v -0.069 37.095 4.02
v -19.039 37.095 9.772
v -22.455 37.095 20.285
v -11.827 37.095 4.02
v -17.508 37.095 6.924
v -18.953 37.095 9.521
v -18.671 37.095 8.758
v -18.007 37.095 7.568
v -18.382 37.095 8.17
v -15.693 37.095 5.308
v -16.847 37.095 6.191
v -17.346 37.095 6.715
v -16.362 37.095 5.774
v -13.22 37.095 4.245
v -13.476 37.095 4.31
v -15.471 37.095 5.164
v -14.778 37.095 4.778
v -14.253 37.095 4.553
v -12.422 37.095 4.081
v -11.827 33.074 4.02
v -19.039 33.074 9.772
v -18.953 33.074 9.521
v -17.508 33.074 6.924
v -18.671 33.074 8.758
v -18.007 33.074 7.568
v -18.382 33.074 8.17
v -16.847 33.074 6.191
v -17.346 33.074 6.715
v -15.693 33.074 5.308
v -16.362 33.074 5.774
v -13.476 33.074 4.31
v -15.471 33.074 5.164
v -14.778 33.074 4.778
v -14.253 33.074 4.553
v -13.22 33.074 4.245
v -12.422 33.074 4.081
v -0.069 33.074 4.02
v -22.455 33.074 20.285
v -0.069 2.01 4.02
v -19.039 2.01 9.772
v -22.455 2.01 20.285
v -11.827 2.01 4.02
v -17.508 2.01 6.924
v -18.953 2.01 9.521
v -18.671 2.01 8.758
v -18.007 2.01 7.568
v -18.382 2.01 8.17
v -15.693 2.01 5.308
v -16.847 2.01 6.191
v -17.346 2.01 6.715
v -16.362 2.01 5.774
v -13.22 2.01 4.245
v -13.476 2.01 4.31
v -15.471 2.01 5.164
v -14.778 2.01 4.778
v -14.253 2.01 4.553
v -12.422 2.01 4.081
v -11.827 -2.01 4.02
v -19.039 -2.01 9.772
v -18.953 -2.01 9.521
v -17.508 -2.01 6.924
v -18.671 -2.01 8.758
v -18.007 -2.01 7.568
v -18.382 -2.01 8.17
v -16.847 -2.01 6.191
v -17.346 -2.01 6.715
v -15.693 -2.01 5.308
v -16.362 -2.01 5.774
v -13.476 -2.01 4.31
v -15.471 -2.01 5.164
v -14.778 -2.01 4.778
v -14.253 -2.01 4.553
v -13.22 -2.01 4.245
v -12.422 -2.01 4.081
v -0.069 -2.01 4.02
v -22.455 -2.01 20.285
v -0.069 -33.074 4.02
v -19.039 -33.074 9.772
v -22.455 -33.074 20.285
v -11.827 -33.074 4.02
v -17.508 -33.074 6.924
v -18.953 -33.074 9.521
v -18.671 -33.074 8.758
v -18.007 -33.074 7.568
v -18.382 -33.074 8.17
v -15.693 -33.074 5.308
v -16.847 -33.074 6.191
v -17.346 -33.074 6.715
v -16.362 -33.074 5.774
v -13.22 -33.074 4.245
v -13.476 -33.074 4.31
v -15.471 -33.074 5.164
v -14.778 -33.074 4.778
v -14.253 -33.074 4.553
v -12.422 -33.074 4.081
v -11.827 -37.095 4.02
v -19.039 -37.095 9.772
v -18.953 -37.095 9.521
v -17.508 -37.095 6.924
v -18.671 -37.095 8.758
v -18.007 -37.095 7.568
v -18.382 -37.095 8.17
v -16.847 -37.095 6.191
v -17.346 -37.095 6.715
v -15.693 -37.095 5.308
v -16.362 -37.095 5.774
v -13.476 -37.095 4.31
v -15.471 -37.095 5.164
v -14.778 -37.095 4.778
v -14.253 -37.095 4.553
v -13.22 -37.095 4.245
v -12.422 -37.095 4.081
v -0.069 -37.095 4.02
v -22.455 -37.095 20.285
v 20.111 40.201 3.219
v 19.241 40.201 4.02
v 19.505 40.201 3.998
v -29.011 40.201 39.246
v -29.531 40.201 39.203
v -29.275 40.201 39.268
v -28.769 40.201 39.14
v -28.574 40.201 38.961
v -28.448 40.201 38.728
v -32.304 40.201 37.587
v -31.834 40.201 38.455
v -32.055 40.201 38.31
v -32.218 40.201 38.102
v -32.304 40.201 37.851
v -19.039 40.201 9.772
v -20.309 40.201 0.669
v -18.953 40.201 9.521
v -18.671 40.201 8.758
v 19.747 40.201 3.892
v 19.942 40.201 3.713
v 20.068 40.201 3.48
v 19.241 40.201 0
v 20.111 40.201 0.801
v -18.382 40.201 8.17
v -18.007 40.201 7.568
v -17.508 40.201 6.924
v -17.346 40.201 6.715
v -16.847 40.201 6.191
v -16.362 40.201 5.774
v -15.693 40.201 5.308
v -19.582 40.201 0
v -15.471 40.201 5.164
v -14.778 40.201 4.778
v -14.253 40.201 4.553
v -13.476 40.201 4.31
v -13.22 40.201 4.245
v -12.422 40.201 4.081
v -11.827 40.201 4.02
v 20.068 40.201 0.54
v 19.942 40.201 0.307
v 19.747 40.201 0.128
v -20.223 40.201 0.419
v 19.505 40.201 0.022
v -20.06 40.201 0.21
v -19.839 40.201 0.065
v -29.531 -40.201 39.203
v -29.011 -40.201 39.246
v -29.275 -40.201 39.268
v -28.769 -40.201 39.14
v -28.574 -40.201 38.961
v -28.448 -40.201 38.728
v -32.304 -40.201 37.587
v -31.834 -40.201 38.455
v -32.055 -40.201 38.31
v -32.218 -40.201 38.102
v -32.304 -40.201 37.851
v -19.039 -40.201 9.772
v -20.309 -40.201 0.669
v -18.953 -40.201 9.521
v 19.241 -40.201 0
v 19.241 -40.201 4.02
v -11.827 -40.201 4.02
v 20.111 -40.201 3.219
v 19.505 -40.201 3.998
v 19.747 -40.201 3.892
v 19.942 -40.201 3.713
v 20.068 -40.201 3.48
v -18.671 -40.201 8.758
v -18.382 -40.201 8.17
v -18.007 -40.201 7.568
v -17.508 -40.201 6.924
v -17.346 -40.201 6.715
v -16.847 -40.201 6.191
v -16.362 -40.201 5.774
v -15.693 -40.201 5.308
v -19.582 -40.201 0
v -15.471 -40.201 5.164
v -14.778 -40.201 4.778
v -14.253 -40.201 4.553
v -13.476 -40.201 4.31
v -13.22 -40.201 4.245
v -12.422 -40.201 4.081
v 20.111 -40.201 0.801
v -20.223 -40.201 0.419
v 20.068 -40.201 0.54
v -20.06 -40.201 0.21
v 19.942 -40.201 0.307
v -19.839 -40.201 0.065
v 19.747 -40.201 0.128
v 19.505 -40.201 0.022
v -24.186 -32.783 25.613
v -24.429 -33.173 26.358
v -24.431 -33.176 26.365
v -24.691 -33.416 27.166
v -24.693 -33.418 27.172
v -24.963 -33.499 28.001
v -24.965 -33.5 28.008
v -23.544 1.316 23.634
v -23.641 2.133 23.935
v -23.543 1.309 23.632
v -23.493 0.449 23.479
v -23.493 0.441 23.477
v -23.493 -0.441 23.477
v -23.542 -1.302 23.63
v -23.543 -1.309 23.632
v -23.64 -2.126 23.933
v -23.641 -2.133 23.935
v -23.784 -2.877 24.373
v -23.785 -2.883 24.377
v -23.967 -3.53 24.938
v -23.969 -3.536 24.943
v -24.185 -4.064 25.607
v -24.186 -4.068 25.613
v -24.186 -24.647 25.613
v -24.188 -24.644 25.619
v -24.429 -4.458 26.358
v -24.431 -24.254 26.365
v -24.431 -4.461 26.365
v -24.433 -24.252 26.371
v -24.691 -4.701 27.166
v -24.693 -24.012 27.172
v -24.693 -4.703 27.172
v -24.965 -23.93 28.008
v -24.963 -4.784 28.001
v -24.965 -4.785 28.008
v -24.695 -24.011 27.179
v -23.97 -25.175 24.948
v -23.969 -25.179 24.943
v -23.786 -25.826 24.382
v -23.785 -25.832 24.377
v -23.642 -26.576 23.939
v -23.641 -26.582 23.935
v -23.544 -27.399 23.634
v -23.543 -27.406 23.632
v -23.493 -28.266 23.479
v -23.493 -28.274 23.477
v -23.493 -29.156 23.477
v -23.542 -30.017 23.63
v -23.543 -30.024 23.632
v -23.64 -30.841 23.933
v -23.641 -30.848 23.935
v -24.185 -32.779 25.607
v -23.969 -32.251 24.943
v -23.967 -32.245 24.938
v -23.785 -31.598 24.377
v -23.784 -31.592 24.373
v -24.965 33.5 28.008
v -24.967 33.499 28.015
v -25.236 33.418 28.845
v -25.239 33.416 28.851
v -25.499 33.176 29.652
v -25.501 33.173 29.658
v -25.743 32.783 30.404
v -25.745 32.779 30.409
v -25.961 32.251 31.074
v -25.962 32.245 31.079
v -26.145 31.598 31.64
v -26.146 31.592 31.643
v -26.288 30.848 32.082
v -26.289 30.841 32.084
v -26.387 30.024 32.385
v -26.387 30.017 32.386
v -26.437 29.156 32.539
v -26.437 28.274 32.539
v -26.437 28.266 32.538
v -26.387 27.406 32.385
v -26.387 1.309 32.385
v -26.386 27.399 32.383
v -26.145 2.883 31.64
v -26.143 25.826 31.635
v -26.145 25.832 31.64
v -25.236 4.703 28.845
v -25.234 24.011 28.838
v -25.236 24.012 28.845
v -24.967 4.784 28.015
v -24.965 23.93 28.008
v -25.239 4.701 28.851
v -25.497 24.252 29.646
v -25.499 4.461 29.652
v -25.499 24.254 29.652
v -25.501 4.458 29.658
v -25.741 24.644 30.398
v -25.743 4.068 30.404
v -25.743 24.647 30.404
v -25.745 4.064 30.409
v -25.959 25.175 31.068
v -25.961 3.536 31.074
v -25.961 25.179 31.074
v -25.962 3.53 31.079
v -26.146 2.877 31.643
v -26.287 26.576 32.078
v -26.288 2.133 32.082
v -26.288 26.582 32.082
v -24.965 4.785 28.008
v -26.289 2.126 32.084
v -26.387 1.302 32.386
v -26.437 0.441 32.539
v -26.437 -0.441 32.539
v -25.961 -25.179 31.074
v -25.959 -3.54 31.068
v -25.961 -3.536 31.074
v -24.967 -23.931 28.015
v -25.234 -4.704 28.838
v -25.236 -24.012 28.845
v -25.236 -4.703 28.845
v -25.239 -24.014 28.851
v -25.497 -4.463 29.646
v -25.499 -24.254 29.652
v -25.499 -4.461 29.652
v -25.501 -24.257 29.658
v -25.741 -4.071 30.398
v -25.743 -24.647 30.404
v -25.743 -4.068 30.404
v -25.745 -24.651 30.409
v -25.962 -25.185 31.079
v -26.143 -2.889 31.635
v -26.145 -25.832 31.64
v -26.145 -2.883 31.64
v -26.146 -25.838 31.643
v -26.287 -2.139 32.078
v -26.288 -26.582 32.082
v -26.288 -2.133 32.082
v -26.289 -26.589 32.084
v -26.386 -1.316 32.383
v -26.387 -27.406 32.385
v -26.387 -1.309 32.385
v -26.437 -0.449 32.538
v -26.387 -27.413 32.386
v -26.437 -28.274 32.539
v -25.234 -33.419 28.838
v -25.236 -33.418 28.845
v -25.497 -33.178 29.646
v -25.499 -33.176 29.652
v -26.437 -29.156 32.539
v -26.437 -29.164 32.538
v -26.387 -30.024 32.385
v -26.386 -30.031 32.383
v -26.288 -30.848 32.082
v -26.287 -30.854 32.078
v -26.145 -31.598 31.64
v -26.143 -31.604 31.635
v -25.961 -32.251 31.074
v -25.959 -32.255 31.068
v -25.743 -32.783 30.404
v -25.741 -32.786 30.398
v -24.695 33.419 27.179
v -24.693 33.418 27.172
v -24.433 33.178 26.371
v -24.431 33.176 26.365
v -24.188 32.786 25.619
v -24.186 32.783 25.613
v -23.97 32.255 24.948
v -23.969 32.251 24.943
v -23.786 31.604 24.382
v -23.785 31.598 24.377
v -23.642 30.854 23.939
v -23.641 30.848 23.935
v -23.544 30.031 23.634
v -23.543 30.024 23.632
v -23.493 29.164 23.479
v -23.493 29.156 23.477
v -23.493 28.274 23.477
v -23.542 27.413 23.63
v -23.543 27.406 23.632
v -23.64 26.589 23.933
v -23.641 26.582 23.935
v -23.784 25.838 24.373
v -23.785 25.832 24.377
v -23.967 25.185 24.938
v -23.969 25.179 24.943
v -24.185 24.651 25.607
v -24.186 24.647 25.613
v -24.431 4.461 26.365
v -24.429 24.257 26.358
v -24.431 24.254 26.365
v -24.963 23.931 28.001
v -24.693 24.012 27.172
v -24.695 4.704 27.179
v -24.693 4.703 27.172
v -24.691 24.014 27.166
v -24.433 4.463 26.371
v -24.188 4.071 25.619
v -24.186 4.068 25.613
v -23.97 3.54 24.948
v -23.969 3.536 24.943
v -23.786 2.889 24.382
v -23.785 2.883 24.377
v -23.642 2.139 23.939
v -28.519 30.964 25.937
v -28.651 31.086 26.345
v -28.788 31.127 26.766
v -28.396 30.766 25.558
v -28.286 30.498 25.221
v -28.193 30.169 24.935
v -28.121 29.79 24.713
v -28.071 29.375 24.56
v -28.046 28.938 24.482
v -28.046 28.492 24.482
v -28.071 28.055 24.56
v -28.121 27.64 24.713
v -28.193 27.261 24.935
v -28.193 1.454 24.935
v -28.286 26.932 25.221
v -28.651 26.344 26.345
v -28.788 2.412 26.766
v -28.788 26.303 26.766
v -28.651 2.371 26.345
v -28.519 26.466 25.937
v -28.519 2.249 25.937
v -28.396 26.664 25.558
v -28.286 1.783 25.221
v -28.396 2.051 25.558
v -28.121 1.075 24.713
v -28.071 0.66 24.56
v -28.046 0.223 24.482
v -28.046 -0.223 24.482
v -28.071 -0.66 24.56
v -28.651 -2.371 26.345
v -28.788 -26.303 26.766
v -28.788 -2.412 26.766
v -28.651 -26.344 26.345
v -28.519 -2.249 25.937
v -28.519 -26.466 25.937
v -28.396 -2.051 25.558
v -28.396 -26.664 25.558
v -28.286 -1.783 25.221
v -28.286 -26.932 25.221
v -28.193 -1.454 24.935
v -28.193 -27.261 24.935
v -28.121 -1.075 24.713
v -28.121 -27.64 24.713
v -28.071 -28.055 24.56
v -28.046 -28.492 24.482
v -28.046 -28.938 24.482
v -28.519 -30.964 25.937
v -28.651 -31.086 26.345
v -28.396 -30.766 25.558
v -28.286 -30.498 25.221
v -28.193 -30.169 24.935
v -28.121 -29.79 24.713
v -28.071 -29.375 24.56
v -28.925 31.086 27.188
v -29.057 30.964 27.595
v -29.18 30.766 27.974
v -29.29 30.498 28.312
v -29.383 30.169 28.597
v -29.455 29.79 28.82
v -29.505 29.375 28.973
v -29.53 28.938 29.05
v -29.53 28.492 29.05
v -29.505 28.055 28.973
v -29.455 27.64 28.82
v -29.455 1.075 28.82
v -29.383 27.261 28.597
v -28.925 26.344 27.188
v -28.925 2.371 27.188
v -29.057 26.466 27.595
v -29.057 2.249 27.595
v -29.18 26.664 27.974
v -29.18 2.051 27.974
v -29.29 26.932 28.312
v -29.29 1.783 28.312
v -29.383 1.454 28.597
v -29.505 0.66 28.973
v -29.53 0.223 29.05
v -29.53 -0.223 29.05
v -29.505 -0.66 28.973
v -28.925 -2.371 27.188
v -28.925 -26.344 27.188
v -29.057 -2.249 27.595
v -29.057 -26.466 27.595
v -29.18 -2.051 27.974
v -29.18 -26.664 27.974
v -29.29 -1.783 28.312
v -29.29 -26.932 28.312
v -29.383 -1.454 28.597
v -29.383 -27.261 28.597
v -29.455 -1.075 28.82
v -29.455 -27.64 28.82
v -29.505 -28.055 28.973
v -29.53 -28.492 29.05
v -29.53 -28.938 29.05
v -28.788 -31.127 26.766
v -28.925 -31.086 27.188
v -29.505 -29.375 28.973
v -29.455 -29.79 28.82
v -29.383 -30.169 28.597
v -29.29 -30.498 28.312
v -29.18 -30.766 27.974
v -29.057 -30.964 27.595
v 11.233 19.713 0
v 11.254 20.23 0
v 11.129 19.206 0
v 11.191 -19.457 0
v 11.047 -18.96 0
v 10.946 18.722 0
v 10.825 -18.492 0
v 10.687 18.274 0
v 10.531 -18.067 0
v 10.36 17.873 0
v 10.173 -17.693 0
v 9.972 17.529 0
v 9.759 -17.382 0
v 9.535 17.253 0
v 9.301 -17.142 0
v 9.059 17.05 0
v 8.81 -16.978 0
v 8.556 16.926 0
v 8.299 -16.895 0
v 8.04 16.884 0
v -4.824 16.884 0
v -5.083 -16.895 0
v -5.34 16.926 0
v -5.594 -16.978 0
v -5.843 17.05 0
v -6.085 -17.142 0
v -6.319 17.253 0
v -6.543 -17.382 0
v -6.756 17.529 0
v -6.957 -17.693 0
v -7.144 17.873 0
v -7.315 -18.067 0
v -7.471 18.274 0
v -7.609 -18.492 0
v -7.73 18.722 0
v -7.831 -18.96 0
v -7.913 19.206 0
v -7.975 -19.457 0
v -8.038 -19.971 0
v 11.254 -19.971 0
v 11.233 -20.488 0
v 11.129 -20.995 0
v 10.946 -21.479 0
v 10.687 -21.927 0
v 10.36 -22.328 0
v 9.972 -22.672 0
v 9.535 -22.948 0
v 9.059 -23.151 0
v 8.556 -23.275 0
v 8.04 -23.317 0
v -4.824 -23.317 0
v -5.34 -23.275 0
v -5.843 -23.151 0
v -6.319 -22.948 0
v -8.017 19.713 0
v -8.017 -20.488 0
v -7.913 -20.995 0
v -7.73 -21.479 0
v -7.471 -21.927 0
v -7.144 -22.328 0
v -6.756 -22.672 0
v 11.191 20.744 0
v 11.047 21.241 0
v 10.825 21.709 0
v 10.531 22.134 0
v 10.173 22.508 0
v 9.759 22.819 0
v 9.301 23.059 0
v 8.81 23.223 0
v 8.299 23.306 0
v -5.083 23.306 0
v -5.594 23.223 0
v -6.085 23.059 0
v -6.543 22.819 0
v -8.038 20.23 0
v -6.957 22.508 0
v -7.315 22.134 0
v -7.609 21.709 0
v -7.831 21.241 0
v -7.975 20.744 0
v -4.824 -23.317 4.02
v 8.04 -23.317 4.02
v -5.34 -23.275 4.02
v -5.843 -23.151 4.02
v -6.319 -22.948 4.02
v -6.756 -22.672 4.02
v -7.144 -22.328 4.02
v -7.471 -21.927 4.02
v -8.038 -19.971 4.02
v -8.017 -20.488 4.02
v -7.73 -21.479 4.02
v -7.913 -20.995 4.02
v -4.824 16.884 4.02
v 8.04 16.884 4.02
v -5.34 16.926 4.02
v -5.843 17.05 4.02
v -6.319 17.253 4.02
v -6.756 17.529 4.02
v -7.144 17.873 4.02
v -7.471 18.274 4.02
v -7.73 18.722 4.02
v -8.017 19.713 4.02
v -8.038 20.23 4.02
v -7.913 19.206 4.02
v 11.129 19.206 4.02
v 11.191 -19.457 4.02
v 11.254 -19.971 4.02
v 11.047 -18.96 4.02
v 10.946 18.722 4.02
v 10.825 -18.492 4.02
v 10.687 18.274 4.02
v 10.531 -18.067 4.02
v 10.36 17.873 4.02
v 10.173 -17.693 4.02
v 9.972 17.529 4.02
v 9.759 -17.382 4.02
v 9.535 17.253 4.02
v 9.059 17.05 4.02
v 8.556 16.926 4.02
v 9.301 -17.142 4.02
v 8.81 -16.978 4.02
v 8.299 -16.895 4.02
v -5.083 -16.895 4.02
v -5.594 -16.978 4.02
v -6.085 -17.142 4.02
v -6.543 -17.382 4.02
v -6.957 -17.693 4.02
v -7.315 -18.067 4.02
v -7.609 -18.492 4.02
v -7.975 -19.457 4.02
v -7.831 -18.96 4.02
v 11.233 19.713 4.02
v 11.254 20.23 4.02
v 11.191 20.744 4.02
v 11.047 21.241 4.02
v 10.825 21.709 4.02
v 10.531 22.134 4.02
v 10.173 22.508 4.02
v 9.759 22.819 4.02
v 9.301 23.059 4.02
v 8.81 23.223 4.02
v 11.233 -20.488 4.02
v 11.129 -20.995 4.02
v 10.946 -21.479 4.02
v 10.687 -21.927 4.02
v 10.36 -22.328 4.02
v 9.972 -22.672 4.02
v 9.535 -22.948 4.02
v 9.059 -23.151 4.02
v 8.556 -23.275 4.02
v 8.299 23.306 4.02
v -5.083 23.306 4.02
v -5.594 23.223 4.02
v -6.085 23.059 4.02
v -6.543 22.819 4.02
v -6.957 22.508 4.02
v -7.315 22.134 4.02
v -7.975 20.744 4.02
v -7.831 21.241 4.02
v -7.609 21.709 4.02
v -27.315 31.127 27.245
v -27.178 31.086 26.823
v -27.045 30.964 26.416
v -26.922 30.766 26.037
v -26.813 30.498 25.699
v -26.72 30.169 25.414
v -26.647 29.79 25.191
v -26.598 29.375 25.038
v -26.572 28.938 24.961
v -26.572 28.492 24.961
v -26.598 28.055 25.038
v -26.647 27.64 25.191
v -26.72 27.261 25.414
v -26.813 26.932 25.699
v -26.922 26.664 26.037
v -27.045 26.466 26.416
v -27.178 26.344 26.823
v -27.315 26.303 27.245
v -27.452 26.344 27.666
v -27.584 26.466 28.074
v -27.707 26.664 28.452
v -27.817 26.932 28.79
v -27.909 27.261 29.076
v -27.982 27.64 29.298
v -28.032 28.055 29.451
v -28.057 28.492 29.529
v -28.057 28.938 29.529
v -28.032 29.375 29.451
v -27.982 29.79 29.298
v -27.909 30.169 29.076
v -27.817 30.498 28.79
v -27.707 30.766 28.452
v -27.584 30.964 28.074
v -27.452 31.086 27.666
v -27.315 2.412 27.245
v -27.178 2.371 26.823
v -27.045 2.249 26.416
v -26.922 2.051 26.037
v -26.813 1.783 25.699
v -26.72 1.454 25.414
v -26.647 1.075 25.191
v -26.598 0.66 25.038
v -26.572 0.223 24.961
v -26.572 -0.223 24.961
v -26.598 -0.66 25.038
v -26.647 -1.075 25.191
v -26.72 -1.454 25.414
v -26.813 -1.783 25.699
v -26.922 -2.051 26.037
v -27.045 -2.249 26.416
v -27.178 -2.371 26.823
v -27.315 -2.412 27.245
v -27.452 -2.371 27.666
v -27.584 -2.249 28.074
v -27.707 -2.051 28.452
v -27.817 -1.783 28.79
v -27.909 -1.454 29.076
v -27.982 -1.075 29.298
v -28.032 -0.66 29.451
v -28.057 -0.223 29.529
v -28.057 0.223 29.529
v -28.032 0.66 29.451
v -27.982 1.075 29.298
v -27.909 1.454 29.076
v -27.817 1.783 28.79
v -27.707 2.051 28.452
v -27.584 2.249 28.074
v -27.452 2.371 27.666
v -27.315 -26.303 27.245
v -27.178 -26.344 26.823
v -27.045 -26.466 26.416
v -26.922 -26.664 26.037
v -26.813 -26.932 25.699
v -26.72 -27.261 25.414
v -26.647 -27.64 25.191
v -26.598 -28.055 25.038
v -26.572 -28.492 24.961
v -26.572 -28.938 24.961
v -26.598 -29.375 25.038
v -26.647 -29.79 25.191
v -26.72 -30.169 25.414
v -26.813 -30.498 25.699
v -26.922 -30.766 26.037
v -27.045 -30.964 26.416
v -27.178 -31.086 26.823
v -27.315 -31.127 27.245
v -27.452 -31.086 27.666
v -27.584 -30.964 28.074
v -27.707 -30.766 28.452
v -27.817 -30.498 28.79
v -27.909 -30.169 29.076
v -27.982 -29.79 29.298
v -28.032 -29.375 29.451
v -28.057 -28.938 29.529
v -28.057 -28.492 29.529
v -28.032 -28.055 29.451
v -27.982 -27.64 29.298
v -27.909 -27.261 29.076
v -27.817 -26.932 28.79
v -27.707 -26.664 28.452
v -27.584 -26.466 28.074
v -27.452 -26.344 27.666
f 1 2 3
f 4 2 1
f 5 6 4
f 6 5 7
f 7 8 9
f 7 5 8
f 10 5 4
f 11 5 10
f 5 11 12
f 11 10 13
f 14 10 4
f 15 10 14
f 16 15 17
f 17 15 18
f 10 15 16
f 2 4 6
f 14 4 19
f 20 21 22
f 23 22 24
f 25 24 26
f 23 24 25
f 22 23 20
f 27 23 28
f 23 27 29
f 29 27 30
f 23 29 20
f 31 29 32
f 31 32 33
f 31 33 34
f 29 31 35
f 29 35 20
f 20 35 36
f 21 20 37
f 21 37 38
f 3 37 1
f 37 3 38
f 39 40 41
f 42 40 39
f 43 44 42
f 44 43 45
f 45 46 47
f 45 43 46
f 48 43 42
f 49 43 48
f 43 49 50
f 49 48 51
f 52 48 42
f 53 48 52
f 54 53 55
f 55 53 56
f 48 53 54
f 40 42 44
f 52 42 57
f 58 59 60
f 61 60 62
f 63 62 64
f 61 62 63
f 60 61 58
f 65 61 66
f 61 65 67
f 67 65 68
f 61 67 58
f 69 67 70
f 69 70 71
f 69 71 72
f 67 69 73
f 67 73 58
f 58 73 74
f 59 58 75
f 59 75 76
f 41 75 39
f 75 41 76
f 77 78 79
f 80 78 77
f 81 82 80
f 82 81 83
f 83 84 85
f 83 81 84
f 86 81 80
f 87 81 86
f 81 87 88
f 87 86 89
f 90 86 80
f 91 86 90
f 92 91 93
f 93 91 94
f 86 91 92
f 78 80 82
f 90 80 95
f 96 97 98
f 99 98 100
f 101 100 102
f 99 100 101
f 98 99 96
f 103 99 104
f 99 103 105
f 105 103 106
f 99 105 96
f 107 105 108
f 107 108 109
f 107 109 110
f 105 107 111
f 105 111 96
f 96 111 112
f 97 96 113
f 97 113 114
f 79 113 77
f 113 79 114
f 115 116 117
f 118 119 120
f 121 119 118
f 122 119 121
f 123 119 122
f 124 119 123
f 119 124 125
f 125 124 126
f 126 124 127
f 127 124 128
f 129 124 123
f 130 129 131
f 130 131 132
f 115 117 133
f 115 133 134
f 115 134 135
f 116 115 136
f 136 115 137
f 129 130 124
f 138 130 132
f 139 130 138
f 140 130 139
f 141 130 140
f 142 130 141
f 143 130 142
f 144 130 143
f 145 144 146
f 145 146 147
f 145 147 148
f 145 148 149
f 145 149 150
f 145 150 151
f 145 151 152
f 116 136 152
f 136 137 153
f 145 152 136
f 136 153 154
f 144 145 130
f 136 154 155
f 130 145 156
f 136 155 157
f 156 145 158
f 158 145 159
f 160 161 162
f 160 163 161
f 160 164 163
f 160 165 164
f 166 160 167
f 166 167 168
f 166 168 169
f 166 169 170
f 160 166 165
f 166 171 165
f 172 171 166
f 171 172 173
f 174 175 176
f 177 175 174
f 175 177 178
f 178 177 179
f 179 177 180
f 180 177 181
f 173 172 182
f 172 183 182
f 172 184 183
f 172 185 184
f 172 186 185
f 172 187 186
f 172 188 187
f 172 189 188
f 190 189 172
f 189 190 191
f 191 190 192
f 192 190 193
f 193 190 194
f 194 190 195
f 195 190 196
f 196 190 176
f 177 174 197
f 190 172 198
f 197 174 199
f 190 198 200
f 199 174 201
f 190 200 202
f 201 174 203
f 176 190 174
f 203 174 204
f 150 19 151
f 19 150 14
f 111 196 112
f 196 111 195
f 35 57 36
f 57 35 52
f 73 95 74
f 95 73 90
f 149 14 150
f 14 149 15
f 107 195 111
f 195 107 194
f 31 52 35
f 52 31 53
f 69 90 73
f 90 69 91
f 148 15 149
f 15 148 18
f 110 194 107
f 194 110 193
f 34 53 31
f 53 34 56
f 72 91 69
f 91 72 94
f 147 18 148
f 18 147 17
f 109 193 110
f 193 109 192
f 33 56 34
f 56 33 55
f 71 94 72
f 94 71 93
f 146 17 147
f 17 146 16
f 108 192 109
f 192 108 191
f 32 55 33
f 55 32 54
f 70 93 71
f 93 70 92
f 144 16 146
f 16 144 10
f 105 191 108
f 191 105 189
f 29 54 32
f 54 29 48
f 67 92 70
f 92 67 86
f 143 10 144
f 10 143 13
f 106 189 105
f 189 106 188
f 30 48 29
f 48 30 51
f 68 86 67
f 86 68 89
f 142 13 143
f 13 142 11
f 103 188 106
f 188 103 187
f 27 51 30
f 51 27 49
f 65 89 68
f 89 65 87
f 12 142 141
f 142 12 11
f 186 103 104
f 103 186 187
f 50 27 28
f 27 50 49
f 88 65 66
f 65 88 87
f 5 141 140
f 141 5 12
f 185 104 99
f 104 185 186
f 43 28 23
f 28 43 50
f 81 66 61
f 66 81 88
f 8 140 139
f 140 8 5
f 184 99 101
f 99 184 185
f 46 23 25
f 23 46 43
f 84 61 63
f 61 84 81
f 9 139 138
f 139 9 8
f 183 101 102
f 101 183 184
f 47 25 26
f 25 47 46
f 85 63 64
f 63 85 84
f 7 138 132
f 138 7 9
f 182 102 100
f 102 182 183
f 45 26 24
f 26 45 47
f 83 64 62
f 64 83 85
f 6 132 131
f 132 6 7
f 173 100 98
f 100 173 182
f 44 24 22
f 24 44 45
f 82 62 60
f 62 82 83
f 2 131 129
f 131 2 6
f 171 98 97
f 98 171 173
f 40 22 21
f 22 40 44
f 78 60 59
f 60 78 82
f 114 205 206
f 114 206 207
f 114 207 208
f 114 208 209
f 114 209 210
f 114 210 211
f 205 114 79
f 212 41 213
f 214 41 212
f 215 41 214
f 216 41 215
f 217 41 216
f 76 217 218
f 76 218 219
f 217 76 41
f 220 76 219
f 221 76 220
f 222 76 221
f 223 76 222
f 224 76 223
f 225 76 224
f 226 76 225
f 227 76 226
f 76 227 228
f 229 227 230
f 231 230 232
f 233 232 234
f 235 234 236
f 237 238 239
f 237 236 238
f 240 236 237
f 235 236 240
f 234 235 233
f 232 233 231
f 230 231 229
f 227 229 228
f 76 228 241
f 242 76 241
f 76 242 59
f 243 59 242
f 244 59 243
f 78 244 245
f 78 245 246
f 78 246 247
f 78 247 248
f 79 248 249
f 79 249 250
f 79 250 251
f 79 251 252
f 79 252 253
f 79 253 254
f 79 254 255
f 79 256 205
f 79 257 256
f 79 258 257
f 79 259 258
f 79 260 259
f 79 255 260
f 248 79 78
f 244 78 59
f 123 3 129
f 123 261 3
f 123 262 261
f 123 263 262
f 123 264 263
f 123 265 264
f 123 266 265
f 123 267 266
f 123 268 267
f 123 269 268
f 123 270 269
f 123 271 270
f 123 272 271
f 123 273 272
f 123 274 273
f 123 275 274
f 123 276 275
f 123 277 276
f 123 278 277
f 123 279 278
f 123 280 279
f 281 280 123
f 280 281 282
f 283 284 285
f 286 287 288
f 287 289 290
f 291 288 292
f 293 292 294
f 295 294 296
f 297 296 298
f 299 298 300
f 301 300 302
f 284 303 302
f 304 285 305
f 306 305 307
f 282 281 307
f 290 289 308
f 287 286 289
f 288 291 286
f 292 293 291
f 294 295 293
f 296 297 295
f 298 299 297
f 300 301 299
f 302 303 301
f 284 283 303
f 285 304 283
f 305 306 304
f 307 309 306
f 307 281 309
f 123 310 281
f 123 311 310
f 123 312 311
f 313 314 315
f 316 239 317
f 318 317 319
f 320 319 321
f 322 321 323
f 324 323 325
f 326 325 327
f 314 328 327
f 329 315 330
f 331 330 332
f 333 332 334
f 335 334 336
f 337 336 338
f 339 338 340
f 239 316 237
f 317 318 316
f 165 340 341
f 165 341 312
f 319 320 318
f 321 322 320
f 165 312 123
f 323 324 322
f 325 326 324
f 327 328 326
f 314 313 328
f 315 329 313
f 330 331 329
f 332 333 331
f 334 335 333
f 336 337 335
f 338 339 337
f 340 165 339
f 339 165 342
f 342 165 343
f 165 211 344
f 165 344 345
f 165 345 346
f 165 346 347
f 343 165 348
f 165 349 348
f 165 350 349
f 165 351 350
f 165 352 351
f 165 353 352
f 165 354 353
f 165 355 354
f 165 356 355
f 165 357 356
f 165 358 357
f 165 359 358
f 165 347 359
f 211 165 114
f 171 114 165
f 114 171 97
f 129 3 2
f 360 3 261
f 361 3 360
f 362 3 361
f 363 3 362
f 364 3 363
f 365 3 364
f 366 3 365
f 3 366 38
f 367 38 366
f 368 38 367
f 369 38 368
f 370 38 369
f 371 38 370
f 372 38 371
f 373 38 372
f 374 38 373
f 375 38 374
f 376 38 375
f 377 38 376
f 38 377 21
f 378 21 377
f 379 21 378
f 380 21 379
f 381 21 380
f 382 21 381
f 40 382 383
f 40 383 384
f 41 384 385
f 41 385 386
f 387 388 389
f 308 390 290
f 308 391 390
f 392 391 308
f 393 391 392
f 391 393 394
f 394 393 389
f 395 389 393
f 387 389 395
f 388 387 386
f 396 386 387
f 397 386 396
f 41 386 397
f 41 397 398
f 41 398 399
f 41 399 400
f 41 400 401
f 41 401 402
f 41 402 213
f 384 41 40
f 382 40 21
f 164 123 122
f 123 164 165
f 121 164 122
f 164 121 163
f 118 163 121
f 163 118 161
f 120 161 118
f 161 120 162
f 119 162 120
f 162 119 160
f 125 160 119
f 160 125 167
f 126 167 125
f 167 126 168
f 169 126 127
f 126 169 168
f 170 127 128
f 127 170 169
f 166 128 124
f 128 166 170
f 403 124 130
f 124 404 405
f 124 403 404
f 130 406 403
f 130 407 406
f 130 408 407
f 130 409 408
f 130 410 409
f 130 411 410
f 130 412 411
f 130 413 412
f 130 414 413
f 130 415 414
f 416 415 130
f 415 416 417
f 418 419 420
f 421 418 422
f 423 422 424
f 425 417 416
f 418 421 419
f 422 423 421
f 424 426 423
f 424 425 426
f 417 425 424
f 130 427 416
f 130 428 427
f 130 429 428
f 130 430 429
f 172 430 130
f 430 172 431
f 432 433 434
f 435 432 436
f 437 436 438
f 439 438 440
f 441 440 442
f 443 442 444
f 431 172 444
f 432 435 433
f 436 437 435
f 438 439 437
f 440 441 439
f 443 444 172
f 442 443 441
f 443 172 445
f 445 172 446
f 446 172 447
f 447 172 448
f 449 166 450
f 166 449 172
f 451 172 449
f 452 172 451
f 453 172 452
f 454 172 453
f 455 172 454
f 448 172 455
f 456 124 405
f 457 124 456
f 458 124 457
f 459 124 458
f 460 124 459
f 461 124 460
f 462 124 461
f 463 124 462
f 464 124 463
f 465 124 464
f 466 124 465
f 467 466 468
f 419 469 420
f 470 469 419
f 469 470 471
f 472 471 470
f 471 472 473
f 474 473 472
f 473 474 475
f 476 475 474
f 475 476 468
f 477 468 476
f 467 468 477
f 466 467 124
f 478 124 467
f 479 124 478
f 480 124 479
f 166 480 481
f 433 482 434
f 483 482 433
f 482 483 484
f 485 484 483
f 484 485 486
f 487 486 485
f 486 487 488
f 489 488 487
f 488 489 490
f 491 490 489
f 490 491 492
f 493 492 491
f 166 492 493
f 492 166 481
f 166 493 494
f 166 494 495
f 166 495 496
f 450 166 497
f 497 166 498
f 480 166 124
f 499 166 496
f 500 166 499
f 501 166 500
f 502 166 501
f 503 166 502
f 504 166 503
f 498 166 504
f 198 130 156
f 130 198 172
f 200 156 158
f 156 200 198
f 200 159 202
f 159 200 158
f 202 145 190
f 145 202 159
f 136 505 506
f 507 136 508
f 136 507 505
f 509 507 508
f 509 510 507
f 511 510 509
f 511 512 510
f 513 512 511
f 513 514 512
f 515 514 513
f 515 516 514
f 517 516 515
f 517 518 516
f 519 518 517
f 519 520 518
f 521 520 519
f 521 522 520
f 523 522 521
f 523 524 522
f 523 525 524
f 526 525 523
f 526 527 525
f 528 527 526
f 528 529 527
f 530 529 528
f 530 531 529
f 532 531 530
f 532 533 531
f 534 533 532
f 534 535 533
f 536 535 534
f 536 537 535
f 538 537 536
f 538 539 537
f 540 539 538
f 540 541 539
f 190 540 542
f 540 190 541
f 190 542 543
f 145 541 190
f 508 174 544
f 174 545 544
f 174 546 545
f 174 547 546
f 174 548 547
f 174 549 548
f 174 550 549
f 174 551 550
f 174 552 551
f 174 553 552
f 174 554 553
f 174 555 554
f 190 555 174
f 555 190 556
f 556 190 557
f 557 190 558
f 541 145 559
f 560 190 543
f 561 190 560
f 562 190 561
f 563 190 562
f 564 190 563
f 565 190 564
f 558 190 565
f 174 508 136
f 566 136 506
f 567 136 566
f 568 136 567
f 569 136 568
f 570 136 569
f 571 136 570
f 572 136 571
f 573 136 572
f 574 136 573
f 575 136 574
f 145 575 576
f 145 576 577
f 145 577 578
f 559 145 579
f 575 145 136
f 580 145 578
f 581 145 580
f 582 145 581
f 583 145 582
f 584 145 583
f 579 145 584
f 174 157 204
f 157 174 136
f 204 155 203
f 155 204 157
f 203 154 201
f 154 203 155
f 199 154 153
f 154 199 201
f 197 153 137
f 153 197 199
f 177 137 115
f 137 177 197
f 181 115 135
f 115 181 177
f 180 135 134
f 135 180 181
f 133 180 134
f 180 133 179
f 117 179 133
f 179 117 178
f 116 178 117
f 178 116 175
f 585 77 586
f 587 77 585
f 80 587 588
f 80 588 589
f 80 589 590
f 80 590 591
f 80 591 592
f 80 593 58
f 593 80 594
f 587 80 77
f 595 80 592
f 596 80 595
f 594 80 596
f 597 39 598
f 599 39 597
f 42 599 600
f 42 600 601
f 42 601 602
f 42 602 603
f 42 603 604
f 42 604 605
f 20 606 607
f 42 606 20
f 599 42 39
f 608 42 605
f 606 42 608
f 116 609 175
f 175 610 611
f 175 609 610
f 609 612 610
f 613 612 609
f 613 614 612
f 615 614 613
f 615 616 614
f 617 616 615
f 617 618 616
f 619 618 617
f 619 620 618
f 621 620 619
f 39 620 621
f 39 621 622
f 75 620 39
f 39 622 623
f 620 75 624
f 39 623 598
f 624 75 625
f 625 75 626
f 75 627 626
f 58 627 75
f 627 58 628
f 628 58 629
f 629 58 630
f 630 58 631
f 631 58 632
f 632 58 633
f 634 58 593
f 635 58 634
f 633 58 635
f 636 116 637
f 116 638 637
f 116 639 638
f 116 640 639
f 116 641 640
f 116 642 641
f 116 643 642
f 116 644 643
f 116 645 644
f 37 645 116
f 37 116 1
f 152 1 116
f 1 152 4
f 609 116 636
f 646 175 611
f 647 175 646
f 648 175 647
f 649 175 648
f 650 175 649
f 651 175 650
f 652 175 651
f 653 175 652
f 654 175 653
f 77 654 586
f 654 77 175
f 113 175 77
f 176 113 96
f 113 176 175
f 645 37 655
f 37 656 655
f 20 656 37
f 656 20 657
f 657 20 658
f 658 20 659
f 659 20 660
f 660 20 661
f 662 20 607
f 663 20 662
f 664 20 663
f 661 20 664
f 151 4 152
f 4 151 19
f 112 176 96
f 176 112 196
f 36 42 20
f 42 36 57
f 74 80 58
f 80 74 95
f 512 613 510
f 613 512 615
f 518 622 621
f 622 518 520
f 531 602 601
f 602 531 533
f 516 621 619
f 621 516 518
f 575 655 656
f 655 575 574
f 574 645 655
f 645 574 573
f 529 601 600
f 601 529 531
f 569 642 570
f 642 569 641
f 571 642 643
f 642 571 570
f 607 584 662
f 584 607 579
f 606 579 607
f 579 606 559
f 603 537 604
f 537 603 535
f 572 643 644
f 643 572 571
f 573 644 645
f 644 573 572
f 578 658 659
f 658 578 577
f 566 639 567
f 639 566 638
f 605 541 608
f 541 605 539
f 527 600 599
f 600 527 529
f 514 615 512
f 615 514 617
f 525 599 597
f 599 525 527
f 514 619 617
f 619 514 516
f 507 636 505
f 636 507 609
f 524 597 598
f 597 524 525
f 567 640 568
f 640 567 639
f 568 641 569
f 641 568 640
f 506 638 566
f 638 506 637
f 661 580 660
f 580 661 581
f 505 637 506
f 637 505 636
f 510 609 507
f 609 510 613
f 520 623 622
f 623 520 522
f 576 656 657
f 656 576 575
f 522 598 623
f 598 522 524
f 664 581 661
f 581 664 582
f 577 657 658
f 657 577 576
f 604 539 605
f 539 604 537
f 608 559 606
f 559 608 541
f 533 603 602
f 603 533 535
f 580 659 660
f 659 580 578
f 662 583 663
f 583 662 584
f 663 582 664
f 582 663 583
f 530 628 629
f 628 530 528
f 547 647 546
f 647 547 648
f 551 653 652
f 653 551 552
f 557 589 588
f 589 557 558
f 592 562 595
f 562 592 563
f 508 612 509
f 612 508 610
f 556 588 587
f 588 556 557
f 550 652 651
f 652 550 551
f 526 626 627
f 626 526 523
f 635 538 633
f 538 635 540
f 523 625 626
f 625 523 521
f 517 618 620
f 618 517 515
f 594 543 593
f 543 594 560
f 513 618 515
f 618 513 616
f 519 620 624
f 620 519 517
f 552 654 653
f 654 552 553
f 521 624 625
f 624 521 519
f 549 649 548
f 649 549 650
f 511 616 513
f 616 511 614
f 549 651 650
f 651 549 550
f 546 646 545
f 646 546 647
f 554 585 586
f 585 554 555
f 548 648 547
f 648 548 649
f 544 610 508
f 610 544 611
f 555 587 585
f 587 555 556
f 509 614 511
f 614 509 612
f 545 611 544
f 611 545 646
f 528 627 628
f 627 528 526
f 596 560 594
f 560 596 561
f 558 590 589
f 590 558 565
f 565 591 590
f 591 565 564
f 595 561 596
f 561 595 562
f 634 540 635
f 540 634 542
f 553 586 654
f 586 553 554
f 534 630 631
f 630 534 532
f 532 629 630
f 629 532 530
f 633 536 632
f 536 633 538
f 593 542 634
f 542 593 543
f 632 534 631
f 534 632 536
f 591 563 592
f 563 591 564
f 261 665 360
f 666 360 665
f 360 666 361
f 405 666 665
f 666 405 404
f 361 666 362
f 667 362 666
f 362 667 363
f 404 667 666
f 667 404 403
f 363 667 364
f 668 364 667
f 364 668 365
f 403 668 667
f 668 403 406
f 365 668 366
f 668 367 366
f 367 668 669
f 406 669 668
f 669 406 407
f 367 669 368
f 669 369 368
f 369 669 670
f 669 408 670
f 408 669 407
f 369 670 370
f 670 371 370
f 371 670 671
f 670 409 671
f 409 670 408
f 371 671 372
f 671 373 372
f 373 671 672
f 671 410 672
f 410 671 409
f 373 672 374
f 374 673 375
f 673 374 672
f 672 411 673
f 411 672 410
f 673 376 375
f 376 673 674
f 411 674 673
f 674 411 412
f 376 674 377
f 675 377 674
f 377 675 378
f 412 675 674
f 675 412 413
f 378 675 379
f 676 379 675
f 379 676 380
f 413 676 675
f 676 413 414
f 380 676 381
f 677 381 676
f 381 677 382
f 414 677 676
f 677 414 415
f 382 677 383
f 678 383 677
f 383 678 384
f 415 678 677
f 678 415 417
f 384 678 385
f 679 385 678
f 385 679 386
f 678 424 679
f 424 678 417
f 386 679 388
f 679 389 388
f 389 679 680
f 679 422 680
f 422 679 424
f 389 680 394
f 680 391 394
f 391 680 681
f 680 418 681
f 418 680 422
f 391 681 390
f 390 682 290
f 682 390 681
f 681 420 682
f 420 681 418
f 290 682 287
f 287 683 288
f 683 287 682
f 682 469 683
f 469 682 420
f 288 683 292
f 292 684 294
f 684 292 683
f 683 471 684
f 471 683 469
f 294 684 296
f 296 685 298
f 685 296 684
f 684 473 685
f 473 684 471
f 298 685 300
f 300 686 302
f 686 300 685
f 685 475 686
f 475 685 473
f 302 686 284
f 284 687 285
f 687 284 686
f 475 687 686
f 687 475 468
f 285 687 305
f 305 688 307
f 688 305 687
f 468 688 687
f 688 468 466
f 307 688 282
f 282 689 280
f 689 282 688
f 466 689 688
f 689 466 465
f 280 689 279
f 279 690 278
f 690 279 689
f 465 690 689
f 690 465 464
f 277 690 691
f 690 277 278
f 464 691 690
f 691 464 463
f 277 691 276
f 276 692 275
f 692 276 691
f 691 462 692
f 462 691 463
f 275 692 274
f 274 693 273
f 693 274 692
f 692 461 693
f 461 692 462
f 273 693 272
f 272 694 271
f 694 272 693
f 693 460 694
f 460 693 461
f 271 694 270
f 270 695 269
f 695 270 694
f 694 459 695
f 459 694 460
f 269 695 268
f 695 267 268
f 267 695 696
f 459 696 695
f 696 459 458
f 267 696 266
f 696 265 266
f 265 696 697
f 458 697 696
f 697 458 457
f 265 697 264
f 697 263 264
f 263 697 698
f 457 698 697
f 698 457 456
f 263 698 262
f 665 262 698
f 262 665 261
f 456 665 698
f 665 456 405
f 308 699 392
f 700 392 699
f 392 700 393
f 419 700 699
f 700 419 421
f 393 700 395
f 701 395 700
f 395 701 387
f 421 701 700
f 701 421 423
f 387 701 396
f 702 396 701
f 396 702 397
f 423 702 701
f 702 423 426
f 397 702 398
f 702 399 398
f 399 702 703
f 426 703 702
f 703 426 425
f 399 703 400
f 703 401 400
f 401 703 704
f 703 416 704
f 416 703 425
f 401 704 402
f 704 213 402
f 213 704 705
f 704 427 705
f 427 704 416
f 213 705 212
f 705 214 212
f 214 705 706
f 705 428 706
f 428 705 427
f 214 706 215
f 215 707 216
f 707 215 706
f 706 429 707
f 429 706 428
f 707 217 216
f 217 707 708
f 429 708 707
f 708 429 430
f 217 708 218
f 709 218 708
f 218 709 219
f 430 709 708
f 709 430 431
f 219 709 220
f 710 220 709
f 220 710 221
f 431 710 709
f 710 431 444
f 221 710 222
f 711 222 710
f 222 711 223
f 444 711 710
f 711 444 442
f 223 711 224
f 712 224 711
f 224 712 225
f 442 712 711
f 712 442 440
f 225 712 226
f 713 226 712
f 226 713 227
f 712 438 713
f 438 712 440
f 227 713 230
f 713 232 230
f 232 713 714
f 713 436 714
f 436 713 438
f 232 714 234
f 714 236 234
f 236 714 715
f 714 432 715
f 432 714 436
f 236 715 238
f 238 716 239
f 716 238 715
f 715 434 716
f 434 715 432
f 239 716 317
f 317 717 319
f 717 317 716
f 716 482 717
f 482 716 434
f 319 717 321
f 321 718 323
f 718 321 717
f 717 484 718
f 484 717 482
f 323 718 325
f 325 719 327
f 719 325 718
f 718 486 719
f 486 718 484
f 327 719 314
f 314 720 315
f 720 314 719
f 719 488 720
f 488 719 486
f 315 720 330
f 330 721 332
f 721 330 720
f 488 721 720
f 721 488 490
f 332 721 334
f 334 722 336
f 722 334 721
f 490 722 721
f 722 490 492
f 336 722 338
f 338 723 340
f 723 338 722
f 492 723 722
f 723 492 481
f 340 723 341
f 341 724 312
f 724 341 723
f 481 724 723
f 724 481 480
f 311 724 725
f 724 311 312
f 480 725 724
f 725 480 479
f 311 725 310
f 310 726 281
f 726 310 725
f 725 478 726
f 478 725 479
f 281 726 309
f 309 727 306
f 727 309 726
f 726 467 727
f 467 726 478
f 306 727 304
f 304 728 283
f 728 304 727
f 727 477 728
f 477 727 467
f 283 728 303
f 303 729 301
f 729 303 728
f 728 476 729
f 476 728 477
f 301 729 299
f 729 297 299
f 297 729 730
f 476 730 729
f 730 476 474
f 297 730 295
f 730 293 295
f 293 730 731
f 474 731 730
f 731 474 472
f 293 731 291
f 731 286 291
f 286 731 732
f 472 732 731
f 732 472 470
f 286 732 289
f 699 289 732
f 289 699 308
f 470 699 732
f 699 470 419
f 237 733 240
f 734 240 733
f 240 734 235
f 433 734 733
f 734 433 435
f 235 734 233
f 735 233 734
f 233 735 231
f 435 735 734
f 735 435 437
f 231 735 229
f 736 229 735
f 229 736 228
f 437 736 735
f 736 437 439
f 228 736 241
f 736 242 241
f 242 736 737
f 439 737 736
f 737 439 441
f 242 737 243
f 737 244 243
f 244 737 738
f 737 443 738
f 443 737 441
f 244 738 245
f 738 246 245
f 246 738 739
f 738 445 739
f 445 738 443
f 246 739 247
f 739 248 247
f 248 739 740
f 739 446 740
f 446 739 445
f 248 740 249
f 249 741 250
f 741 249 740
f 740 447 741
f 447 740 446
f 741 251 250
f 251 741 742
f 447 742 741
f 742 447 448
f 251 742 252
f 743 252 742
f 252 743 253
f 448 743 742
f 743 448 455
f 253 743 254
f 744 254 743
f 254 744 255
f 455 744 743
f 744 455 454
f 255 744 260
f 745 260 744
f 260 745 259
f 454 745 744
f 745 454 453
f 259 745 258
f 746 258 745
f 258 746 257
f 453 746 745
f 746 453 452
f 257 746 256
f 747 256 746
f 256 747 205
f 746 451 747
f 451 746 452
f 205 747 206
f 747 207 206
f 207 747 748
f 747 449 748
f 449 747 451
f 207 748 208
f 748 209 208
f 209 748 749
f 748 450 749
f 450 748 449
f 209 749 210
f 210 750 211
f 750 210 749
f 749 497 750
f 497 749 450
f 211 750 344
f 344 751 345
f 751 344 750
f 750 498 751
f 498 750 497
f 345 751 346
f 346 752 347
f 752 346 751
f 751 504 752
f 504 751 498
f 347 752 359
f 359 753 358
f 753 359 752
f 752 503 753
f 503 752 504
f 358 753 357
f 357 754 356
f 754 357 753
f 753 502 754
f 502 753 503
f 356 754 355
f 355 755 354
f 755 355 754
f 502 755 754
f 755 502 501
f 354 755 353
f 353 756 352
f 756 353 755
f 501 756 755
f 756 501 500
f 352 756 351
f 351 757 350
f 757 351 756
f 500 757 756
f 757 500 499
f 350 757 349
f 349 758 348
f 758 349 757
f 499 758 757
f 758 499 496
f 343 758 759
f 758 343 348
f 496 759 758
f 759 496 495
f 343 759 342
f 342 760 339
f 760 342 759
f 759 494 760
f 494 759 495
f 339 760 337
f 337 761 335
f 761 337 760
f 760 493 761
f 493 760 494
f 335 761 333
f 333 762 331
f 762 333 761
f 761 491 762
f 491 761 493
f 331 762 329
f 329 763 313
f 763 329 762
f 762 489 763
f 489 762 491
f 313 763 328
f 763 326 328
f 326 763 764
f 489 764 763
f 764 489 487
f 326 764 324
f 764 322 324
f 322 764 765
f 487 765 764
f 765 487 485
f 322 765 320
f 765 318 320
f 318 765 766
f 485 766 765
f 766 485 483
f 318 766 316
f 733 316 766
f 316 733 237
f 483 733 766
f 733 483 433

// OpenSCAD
//------------------------------------------------------------------
/*

Angle Brackets

*/
//------------------------------------------------------------------
/* [Global] */

/*[General]*/
bracket_angle = 108;
bracket_length = 80;
wall_thickness = 4;

/*[Arm1]*/
arm1_length = 40;
arm1_holes = 2;
arm1_hole_style = "plain"; // [plain,countersunk]
arm1_hole_diameter = 6.4;
arm1_hole_spacing = 0.5; // [0:0.05:1]
arm1_hole_position = 0.7; // [0:0.05:1]
arm1_hole_elongation = 4.0;

/*[Arm2]*/
arm2_length = 40;
arm2_holes = 3;
arm2_hole_style = "countersunk"; // [plain,countersunk]
arm2_hole_diameter = 4.8;
arm2_hole_spacing = 0.4; // [0:0.05:1]
arm2_hole_position = 0.7; // [0:0.05:1]
arm2_hole_elongation = 0.0;

/*[Webs]*/
number_of_webs = 3;
web_size = 0.5; // [0:0.05:1]
web_spacing = 0.1; // [0:0.05:1]

/*[Fillets]*/
fillet_factor = 2.0;
rounding_factor = 0.2; // [0:0.05:1]

/* [Hidden] */
//------------------------------------------------------------------
// Set the scaling value to compensate for print shrinkage

scale = 1/0.995; // ABS ~0.5% shrinkage
//scale = 1/0.998; // PLA ~0.2% shrinkage

function dim(x) = scale * x;

//------------------------------------------------------------------
// derived values

bracket_l = dim(bracket_length);
arm1 = dim(arm1_length);
arm2 = dim(arm2_length);
wall_t = dim(wall_thickness);
arm1_hole_r = dim(arm1_hole_diameter/2);
arm2_hole_r = dim(arm2_hole_diameter/2);

//------------------------------------------------------------------
// control the number of facets on cylinders

facet_epsilon = 0.01;
function facets(r) = 180 / acos(1 - (facet_epsilon / r));

// small tweak to avoid differencing artifacts
epsilon = 0.05;

//------------------------------------------------------------------
// rounded/filleted edges

module outset(d=1) {
  minkowski() {
    circle(r=d, $fn=facets(d));
    children(0);
  }
}

module inset(d=1) {
  render() inverse() outset(d=d) inverse() children(0);
}

module inverse() {
  difference() {
    square(1e5, center=true);
    children(0);
  }
}

module rounded(r=1) {
  outset(d=r) inset(d=r) children(0);
}

module filleted(r=1) {
  inset(d=r) render() outset(d=r) children(0);
}

//------------------------------------------------------------------

module hole(r, style) {
  if (style == "countersunk") {
    if (r > wall_t) {
      points = [
        [0,0],
        [(2 * r) - wall_t, 0],
        [2 * r, wall_t + (2 * epsilon)],
        [0, wall_t + (2 * epsilon)]
      ];
      rotate_extrude($fn=facets(r)) polygon(points = points);
    } else {
      points = [
        [0,0],
        [r, 0],
        [r, wall_t - r],
        [2 * r, wall_t + (2 * epsilon)],
        [0, wall_t + (2 * epsilon)]
      ];
      rotate_extrude($fn=facets(r)) polygon(points = points);
    }
  } else {
    // plain hole
    cylinder(h=wall_t + (2 * epsilon), r = r, $fn=facets(r));
  }
}

module hole_set(n, r, k, e, style) {
  space = bracket_l/(n - 1 + (2 * k));
  for (i = [1:n]) {
    translate([(k + i - 1) * space, 0, -epsilon]) {
      if (e != 0) {
        hull() {
          translate([0, e * r, 0]) hole(r, style);
          hole(r, style);
        }
      } else {
        hole(r, style);
      }
    }
  }
}

module holes() {
  if (arm1_holes > 0) {
    translate([arm1_hole_position * arm1,0,0]) rotate([-90,-90,0]) {
      hole_set(arm1_holes, arm1_hole_r, arm1_hole_spacing, -arm1_hole_elongation, arm1_hole_style);
    }
  }
  if (arm2_holes > 0) {
    d = arm2_hole_position * arm2;
    c = cos(bracket_angle);
    s = sin(bracket_angle);
    translate([d * c, d * s, 0]) rotate([0,-90,90+bracket_angle]) {
      hole_set(arm2_holes, arm2_hole_r, arm2_hole_spacing, arm2_hole_elongation, arm2_hole_style);
    }
  }
}

module web_profile() {
  c = cos(bracket_angle);
  s = sin(bracket_angle);
  d1 = arm1 * (1-web_size);
  d2 = arm2 * (1-web_size);
  wt = wall_t - epsilon;
  points = [
    [(c + 1) * wt/s, wt],
    [(c * arm2) + (s * wt) - (c * d2), (s * arm2) - (c * wt) - (s * d2)],
    [arm1 - d1, wt],
  ];
  polygon(points=points, convexity=2);
}

module web() {
  linear_extrude(height=wall_t, convexity=2) web_profile();
}

module webs() {
  space = (bracket_l - (number_of_webs * wall_t)) / (number_of_webs - 1 + (2 * web_spacing));
  for (i = [1:number_of_webs]) {
    translate([0, 0, (web_spacing * space) + (i - 1) * (space + wall_t)]) web();
  }
}

module bracket_profile() {
  c = cos(bracket_angle);
  s = sin(bracket_angle);
  d1 = arm1 * (1-web_size);
  d2 = arm2 * (1-web_size);
  points = [
    [arm1, wall_t],
    [arm1, 0],
    [0, 0],
    [c * arm2, s * arm2],
    [(c * arm2) + (s * wall_t), (s * arm2) - (c * wall_t)],
    [(c + 1) * wall_t/s, wall_t],
  ];
  rounded(rounding_factor * wall_t) filleted(fillet_factor * wall_t) polygon(points=points);
}

module bracket() {
  difference() {
    union() {
      linear_extrude(height=bracket_l, convexity=2) bracket_profile();
      if (number_of_webs > 0) {
        webs();
      }
    }
    holes();
  }
}

translate([-arm1/2,bracket_l / 2,0]) rotate([90,0,0]) bracket();

//------------------------------------------------------------------
